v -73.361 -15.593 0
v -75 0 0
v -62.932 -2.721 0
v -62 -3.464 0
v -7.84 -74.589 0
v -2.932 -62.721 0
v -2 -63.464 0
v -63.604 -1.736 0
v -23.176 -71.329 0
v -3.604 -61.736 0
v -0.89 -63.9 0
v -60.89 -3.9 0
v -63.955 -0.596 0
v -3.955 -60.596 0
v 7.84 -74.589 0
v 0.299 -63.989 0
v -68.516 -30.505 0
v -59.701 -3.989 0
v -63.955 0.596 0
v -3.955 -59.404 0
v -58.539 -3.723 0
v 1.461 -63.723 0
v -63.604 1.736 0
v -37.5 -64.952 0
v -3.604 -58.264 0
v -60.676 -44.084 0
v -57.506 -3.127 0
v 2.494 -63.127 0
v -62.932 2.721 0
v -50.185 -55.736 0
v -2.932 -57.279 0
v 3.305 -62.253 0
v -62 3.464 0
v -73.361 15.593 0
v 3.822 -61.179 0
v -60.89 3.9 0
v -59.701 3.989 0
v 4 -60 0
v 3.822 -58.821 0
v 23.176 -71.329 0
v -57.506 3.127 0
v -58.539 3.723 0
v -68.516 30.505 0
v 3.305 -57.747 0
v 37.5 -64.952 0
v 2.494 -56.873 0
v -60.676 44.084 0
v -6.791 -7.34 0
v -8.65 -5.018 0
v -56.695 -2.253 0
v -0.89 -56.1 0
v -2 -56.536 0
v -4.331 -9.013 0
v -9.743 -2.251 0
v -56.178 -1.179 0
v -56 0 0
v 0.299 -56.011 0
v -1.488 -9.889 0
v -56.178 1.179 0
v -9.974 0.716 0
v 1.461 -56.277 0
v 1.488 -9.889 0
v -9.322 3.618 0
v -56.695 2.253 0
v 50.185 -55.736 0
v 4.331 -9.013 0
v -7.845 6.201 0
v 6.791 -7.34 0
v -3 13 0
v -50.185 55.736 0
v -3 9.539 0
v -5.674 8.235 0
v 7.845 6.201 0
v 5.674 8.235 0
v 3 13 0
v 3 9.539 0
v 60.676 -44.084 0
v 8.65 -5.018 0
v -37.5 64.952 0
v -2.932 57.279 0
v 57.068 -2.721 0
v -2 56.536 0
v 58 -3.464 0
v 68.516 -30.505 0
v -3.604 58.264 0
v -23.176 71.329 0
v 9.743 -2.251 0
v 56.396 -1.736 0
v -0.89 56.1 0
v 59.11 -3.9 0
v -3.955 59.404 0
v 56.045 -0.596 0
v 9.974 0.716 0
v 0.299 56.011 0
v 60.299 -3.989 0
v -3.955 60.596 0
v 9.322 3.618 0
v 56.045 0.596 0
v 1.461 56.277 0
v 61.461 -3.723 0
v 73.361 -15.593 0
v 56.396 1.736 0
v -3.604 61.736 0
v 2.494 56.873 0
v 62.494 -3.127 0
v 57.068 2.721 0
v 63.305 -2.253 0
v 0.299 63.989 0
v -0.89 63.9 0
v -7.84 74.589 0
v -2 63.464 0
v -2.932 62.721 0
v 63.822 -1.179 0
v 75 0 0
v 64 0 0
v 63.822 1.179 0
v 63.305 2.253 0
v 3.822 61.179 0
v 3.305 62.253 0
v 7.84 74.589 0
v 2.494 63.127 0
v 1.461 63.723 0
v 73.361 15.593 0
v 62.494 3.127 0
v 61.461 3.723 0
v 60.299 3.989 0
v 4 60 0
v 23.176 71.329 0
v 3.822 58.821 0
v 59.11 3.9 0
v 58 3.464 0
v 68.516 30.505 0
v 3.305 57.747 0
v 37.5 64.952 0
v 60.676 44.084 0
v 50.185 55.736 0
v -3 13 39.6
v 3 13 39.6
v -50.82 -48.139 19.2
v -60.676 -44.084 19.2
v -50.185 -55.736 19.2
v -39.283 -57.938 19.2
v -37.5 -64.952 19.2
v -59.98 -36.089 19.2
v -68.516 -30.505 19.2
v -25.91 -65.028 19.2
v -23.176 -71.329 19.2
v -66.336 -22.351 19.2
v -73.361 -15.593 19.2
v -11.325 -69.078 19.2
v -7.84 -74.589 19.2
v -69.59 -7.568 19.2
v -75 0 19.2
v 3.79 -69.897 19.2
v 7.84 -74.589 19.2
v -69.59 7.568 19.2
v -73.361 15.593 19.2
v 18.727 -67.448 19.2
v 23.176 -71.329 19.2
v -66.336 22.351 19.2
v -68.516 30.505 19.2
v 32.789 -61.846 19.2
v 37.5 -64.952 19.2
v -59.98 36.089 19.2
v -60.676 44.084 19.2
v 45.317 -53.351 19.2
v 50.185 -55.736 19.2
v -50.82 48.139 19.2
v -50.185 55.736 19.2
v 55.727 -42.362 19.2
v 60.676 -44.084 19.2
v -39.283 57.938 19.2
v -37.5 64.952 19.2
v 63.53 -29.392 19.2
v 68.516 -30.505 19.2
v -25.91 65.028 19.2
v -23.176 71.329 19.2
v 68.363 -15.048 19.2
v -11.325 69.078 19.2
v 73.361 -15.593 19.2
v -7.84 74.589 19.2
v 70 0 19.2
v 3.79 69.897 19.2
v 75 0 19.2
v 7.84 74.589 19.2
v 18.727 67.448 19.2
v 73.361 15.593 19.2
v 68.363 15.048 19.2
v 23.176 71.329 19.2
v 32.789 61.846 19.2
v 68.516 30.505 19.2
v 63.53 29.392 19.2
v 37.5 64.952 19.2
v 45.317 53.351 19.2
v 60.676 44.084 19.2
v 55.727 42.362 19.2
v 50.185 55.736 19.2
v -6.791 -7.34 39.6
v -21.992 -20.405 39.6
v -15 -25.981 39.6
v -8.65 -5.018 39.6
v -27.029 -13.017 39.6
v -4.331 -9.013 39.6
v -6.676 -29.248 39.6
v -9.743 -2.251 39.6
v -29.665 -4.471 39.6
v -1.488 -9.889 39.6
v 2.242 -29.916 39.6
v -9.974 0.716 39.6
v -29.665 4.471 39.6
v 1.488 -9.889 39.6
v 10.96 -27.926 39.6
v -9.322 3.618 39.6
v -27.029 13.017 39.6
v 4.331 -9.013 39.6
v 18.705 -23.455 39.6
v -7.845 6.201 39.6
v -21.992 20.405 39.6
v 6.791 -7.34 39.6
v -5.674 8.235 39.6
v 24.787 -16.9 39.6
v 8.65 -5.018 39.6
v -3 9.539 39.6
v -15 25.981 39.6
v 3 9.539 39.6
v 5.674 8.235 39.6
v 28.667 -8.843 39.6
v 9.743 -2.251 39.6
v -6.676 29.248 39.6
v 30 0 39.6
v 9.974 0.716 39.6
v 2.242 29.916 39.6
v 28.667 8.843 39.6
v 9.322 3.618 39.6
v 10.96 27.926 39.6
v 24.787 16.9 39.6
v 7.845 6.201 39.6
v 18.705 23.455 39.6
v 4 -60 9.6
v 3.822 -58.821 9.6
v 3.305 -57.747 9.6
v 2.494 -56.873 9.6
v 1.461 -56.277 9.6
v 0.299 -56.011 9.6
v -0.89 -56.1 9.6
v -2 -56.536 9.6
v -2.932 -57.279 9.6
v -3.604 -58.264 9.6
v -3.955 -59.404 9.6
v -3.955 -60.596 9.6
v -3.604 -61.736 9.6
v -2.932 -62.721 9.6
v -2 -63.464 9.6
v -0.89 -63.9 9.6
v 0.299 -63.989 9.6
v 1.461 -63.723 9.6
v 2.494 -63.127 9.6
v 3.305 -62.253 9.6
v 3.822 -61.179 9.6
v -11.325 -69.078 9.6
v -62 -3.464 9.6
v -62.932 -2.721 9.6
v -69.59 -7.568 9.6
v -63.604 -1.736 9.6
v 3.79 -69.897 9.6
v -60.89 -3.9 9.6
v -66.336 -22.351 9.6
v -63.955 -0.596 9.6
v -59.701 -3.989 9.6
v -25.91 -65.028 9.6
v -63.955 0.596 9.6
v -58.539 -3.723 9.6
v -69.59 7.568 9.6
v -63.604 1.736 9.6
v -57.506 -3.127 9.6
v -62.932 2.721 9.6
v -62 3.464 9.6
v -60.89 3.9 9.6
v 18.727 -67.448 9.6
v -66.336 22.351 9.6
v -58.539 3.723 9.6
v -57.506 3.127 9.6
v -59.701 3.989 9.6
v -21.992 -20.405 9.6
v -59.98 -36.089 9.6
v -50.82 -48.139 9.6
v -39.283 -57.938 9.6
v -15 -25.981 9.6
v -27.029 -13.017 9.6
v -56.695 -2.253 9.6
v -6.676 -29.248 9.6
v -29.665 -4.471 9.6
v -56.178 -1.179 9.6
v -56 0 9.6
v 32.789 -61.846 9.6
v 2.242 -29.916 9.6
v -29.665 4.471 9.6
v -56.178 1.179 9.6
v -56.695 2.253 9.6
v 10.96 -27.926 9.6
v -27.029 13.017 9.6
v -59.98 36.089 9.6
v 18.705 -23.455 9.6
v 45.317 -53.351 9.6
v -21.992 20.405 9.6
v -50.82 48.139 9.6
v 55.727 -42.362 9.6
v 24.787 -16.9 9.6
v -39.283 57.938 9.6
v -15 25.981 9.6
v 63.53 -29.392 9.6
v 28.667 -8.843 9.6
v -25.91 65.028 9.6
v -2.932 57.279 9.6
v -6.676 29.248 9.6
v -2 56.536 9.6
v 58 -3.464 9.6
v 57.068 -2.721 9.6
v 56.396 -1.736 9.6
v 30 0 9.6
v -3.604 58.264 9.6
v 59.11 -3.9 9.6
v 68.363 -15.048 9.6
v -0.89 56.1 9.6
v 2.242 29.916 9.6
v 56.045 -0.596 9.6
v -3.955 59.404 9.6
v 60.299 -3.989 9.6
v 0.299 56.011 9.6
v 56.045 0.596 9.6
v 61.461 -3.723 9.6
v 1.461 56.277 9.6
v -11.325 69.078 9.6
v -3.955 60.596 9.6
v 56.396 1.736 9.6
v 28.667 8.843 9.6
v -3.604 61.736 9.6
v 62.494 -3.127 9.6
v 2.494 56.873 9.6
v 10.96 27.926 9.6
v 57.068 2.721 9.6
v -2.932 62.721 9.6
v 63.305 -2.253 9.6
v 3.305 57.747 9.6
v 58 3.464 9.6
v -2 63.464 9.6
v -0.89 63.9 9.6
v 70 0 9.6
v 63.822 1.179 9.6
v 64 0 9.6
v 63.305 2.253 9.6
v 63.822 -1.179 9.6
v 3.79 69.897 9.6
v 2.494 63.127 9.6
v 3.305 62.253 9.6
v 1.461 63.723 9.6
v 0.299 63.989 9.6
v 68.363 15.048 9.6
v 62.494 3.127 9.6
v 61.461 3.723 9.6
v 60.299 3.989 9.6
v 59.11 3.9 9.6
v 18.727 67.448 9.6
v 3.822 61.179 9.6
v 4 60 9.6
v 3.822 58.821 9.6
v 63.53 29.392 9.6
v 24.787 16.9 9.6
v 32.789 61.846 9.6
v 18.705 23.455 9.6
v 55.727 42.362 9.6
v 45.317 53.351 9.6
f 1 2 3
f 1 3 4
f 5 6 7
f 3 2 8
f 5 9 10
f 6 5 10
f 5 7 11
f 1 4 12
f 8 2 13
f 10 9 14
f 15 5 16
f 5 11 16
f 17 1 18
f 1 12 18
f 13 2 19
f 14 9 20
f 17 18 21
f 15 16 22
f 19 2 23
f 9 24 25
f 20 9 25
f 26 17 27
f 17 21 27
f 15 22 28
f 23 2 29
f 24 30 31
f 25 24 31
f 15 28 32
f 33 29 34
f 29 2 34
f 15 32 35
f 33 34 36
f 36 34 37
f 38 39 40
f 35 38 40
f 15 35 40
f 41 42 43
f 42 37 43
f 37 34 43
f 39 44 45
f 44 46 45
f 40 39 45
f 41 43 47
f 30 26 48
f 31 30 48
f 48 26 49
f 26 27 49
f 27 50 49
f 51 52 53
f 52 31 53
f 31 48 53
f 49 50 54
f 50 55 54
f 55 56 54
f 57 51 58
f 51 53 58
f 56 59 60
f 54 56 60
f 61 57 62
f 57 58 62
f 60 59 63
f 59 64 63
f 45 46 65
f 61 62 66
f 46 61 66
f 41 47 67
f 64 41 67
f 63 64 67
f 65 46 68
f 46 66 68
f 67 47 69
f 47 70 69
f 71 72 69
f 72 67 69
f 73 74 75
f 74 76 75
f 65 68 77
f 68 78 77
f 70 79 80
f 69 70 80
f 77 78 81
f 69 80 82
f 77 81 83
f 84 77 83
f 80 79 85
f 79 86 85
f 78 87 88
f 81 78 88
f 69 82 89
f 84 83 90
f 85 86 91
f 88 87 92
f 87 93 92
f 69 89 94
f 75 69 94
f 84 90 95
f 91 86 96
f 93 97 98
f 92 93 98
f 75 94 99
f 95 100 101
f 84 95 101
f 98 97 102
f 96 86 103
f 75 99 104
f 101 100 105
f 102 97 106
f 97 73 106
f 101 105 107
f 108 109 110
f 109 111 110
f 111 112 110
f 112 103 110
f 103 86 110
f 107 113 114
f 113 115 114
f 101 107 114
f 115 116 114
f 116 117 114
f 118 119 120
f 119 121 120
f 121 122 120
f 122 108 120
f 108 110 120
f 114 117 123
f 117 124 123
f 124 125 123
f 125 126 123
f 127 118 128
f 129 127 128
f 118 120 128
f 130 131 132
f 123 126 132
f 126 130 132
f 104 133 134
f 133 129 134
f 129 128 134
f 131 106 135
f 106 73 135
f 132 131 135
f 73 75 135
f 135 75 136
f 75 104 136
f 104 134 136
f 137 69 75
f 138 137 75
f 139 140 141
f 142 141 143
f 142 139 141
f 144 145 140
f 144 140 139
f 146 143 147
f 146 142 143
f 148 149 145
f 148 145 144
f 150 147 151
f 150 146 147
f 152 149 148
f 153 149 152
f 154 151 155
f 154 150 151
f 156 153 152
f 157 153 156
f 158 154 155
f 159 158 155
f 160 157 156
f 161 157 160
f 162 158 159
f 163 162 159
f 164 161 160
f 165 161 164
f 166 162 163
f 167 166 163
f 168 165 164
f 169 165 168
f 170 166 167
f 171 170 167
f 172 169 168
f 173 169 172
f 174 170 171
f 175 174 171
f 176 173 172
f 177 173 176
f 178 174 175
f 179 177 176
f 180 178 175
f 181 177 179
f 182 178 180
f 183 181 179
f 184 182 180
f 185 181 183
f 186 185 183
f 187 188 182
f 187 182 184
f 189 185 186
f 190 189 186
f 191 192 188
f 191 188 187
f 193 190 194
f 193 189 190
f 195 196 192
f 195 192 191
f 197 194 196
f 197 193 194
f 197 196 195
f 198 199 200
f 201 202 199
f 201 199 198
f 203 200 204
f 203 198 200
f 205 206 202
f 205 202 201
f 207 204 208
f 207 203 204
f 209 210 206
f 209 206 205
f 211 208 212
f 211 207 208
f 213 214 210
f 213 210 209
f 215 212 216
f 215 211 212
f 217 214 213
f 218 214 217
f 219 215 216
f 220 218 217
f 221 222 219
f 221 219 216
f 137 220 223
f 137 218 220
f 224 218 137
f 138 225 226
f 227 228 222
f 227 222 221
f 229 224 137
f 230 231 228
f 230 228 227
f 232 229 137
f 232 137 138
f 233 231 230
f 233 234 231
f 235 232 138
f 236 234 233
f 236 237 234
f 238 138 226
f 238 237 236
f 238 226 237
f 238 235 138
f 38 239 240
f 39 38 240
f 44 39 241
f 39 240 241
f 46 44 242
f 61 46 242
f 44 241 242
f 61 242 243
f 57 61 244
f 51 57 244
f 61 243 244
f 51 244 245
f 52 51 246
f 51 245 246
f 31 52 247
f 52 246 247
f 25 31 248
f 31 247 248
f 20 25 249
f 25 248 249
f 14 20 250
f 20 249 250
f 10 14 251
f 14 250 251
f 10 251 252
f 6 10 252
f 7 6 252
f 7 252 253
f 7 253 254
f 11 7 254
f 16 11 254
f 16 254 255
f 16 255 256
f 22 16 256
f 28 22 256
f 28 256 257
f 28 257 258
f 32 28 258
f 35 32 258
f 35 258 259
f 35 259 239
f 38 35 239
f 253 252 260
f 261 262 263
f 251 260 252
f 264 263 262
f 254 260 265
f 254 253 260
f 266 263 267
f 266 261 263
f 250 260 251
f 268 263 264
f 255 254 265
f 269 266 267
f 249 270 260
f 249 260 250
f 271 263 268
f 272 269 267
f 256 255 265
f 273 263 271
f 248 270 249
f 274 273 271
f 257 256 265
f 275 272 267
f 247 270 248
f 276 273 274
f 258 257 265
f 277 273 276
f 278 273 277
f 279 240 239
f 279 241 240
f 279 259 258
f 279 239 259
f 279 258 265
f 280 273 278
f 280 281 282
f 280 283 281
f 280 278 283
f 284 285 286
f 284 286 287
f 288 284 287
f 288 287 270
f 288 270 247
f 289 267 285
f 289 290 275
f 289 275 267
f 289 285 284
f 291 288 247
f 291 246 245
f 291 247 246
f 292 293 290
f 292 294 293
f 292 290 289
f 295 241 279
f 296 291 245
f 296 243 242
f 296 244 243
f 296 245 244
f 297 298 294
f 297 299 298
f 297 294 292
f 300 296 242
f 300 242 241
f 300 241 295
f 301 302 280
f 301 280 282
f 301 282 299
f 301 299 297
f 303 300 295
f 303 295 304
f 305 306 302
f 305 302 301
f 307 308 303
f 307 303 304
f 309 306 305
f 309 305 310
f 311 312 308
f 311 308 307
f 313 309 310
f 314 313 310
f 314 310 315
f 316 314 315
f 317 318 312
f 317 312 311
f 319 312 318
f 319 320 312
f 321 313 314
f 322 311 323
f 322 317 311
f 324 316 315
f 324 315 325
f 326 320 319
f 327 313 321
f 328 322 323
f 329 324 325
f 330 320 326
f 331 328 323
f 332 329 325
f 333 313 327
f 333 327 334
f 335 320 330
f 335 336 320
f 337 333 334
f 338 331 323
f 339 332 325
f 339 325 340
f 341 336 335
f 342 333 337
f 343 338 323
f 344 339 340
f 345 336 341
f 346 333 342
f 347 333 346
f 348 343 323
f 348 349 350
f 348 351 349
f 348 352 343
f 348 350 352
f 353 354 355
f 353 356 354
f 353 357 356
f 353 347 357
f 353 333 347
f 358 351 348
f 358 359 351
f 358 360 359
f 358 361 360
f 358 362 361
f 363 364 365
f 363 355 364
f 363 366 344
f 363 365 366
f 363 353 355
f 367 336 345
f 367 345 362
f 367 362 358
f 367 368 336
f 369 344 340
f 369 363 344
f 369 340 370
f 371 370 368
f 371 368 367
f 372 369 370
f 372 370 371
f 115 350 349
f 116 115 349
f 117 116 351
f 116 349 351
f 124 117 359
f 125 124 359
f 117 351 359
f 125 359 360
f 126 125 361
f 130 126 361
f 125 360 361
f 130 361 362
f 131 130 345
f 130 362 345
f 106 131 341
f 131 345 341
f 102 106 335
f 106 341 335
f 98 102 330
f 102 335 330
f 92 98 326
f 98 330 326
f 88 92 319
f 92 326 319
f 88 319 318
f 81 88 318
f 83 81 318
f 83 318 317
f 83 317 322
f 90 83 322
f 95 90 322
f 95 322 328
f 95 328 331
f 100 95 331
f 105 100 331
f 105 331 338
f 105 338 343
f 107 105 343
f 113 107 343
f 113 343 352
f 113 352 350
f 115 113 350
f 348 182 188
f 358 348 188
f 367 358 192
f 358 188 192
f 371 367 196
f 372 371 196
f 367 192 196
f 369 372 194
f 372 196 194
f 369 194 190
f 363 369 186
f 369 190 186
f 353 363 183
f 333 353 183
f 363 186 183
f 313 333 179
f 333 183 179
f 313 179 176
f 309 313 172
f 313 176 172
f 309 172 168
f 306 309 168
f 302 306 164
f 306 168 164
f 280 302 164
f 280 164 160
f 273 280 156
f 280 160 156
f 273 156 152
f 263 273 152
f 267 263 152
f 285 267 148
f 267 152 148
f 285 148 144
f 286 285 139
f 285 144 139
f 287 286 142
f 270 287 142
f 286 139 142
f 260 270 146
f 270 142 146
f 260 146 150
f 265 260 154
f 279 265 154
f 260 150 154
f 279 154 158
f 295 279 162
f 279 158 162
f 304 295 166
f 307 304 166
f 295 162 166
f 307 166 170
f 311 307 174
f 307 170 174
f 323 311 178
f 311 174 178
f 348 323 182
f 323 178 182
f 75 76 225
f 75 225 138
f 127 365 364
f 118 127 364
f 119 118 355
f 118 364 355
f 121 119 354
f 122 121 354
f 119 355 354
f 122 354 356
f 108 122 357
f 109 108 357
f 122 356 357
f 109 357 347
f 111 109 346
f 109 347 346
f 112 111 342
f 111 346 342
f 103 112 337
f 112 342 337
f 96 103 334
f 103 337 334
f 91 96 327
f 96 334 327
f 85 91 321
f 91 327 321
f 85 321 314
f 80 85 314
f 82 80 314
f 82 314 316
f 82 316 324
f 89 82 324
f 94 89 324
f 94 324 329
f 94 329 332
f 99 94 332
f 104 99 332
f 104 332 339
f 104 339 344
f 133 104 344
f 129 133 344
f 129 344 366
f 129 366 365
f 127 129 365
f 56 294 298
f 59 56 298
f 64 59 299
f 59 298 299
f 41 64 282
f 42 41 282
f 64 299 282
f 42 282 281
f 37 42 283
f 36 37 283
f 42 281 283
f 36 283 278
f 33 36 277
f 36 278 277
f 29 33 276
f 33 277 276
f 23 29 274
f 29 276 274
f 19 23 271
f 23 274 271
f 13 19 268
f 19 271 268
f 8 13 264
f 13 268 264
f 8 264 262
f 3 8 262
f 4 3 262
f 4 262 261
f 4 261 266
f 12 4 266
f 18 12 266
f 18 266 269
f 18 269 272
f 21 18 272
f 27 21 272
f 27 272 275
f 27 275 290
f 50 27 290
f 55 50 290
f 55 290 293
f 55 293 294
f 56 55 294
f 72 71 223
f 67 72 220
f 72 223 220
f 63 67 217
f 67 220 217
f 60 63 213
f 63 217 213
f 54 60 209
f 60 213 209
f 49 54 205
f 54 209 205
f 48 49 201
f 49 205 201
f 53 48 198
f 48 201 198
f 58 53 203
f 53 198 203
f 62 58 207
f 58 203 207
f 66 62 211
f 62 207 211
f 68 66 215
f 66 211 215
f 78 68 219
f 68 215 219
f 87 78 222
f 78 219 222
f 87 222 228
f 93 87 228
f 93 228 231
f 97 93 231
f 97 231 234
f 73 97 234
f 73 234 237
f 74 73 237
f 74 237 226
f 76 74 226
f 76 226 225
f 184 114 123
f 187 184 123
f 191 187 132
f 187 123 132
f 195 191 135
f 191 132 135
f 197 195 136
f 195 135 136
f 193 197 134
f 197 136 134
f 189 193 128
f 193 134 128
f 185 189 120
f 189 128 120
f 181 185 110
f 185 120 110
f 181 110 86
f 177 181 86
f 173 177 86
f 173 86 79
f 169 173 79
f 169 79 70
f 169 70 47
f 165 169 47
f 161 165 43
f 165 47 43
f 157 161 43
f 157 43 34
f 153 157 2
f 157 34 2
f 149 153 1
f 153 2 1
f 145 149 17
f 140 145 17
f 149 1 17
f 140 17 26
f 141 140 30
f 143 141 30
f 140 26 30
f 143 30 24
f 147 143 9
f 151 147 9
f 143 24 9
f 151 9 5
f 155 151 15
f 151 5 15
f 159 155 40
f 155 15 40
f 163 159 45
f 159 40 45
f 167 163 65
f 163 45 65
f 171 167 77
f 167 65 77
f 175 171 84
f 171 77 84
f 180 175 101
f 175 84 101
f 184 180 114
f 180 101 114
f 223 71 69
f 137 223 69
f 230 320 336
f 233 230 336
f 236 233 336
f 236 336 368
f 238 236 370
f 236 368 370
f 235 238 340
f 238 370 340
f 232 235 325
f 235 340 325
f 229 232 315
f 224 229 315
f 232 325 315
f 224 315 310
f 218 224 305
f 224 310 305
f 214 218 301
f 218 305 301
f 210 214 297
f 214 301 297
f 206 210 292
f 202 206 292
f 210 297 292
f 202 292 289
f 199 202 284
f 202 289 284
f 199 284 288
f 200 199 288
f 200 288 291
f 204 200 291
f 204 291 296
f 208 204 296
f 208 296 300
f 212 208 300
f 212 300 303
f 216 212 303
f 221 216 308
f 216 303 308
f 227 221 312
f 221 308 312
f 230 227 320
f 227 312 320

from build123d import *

# Parameters (mm, degrees)
SKETCH1_R           = 75
BOSS_EXTRUDE3_DEPTH = 19.2
SKETCH3_R           = 70
CUT_EXTRUDE1_DEPTH  = 9.6
SKETCH4_R           = 30
BOSS_EXTRUDE4_DEPTH = 30
SKETCH5_R           = 10
CUT_EXTRUDE2_DEPTH  = 57
SKETCH6_R           = 4
CUT_EXTRUDE3_DEPTH  = 57
SKETCH7_W           = 6
SKETCH7_H           = 6
CUT_EXTRUDE4_DEPTH  = 114.217313164


with BuildPart() as part:
    # Sketch1 → Boss-Extrude3 (new body)
    with BuildSketch(Plane.XY):
        Circle(SKETCH1_R)
    extrude(amount=BOSS_EXTRUDE3_DEPTH)

    # Sketch3 → Cut-Extrude1 (cut)
    with BuildSketch(Plane.XY.offset(19.2)):
        Circle(SKETCH3_R)
    extrude(amount=-CUT_EXTRUDE1_DEPTH, mode=Mode.SUBTRACT)

    # Sketch4 → Boss-Extrude4 (add)
    with BuildSketch(Plane.XY.offset(9.6)):
        Circle(SKETCH4_R)
    extrude(amount=BOSS_EXTRUDE4_DEPTH)

    # Sketch5 → Cut-Extrude2 (cut)
    with BuildSketch(Plane.XY.offset(39.6)):
        Circle(SKETCH5_R)
    extrude(amount=-CUT_EXTRUDE2_DEPTH, mode=Mode.SUBTRACT)

    # Sketch6 → Cut-Extrude3 (cut)
    with BuildSketch(Plane.XY.offset(9.6)):
        with Locations((0, 60)):
            Circle(SKETCH6_R)
        with Locations((60, 0)):
            Circle(SKETCH6_R)
        with Locations((0, -60)):
            Circle(SKETCH6_R)
        with Locations((-60, 0)):
            Circle(SKETCH6_R)
    extrude(amount=-CUT_EXTRUDE3_DEPTH, mode=Mode.SUBTRACT)

    # Sketch7 → Cut-Extrude4 (cut, through all)
    with BuildSketch(Plane.XY.offset(39.6)):
        with Locations((0, 10)):
            Rectangle(SKETCH7_W, SKETCH7_H)
    extrude(amount=-CUT_EXTRUDE4_DEPTH, mode=Mode.SUBTRACT)


solid = part.part
